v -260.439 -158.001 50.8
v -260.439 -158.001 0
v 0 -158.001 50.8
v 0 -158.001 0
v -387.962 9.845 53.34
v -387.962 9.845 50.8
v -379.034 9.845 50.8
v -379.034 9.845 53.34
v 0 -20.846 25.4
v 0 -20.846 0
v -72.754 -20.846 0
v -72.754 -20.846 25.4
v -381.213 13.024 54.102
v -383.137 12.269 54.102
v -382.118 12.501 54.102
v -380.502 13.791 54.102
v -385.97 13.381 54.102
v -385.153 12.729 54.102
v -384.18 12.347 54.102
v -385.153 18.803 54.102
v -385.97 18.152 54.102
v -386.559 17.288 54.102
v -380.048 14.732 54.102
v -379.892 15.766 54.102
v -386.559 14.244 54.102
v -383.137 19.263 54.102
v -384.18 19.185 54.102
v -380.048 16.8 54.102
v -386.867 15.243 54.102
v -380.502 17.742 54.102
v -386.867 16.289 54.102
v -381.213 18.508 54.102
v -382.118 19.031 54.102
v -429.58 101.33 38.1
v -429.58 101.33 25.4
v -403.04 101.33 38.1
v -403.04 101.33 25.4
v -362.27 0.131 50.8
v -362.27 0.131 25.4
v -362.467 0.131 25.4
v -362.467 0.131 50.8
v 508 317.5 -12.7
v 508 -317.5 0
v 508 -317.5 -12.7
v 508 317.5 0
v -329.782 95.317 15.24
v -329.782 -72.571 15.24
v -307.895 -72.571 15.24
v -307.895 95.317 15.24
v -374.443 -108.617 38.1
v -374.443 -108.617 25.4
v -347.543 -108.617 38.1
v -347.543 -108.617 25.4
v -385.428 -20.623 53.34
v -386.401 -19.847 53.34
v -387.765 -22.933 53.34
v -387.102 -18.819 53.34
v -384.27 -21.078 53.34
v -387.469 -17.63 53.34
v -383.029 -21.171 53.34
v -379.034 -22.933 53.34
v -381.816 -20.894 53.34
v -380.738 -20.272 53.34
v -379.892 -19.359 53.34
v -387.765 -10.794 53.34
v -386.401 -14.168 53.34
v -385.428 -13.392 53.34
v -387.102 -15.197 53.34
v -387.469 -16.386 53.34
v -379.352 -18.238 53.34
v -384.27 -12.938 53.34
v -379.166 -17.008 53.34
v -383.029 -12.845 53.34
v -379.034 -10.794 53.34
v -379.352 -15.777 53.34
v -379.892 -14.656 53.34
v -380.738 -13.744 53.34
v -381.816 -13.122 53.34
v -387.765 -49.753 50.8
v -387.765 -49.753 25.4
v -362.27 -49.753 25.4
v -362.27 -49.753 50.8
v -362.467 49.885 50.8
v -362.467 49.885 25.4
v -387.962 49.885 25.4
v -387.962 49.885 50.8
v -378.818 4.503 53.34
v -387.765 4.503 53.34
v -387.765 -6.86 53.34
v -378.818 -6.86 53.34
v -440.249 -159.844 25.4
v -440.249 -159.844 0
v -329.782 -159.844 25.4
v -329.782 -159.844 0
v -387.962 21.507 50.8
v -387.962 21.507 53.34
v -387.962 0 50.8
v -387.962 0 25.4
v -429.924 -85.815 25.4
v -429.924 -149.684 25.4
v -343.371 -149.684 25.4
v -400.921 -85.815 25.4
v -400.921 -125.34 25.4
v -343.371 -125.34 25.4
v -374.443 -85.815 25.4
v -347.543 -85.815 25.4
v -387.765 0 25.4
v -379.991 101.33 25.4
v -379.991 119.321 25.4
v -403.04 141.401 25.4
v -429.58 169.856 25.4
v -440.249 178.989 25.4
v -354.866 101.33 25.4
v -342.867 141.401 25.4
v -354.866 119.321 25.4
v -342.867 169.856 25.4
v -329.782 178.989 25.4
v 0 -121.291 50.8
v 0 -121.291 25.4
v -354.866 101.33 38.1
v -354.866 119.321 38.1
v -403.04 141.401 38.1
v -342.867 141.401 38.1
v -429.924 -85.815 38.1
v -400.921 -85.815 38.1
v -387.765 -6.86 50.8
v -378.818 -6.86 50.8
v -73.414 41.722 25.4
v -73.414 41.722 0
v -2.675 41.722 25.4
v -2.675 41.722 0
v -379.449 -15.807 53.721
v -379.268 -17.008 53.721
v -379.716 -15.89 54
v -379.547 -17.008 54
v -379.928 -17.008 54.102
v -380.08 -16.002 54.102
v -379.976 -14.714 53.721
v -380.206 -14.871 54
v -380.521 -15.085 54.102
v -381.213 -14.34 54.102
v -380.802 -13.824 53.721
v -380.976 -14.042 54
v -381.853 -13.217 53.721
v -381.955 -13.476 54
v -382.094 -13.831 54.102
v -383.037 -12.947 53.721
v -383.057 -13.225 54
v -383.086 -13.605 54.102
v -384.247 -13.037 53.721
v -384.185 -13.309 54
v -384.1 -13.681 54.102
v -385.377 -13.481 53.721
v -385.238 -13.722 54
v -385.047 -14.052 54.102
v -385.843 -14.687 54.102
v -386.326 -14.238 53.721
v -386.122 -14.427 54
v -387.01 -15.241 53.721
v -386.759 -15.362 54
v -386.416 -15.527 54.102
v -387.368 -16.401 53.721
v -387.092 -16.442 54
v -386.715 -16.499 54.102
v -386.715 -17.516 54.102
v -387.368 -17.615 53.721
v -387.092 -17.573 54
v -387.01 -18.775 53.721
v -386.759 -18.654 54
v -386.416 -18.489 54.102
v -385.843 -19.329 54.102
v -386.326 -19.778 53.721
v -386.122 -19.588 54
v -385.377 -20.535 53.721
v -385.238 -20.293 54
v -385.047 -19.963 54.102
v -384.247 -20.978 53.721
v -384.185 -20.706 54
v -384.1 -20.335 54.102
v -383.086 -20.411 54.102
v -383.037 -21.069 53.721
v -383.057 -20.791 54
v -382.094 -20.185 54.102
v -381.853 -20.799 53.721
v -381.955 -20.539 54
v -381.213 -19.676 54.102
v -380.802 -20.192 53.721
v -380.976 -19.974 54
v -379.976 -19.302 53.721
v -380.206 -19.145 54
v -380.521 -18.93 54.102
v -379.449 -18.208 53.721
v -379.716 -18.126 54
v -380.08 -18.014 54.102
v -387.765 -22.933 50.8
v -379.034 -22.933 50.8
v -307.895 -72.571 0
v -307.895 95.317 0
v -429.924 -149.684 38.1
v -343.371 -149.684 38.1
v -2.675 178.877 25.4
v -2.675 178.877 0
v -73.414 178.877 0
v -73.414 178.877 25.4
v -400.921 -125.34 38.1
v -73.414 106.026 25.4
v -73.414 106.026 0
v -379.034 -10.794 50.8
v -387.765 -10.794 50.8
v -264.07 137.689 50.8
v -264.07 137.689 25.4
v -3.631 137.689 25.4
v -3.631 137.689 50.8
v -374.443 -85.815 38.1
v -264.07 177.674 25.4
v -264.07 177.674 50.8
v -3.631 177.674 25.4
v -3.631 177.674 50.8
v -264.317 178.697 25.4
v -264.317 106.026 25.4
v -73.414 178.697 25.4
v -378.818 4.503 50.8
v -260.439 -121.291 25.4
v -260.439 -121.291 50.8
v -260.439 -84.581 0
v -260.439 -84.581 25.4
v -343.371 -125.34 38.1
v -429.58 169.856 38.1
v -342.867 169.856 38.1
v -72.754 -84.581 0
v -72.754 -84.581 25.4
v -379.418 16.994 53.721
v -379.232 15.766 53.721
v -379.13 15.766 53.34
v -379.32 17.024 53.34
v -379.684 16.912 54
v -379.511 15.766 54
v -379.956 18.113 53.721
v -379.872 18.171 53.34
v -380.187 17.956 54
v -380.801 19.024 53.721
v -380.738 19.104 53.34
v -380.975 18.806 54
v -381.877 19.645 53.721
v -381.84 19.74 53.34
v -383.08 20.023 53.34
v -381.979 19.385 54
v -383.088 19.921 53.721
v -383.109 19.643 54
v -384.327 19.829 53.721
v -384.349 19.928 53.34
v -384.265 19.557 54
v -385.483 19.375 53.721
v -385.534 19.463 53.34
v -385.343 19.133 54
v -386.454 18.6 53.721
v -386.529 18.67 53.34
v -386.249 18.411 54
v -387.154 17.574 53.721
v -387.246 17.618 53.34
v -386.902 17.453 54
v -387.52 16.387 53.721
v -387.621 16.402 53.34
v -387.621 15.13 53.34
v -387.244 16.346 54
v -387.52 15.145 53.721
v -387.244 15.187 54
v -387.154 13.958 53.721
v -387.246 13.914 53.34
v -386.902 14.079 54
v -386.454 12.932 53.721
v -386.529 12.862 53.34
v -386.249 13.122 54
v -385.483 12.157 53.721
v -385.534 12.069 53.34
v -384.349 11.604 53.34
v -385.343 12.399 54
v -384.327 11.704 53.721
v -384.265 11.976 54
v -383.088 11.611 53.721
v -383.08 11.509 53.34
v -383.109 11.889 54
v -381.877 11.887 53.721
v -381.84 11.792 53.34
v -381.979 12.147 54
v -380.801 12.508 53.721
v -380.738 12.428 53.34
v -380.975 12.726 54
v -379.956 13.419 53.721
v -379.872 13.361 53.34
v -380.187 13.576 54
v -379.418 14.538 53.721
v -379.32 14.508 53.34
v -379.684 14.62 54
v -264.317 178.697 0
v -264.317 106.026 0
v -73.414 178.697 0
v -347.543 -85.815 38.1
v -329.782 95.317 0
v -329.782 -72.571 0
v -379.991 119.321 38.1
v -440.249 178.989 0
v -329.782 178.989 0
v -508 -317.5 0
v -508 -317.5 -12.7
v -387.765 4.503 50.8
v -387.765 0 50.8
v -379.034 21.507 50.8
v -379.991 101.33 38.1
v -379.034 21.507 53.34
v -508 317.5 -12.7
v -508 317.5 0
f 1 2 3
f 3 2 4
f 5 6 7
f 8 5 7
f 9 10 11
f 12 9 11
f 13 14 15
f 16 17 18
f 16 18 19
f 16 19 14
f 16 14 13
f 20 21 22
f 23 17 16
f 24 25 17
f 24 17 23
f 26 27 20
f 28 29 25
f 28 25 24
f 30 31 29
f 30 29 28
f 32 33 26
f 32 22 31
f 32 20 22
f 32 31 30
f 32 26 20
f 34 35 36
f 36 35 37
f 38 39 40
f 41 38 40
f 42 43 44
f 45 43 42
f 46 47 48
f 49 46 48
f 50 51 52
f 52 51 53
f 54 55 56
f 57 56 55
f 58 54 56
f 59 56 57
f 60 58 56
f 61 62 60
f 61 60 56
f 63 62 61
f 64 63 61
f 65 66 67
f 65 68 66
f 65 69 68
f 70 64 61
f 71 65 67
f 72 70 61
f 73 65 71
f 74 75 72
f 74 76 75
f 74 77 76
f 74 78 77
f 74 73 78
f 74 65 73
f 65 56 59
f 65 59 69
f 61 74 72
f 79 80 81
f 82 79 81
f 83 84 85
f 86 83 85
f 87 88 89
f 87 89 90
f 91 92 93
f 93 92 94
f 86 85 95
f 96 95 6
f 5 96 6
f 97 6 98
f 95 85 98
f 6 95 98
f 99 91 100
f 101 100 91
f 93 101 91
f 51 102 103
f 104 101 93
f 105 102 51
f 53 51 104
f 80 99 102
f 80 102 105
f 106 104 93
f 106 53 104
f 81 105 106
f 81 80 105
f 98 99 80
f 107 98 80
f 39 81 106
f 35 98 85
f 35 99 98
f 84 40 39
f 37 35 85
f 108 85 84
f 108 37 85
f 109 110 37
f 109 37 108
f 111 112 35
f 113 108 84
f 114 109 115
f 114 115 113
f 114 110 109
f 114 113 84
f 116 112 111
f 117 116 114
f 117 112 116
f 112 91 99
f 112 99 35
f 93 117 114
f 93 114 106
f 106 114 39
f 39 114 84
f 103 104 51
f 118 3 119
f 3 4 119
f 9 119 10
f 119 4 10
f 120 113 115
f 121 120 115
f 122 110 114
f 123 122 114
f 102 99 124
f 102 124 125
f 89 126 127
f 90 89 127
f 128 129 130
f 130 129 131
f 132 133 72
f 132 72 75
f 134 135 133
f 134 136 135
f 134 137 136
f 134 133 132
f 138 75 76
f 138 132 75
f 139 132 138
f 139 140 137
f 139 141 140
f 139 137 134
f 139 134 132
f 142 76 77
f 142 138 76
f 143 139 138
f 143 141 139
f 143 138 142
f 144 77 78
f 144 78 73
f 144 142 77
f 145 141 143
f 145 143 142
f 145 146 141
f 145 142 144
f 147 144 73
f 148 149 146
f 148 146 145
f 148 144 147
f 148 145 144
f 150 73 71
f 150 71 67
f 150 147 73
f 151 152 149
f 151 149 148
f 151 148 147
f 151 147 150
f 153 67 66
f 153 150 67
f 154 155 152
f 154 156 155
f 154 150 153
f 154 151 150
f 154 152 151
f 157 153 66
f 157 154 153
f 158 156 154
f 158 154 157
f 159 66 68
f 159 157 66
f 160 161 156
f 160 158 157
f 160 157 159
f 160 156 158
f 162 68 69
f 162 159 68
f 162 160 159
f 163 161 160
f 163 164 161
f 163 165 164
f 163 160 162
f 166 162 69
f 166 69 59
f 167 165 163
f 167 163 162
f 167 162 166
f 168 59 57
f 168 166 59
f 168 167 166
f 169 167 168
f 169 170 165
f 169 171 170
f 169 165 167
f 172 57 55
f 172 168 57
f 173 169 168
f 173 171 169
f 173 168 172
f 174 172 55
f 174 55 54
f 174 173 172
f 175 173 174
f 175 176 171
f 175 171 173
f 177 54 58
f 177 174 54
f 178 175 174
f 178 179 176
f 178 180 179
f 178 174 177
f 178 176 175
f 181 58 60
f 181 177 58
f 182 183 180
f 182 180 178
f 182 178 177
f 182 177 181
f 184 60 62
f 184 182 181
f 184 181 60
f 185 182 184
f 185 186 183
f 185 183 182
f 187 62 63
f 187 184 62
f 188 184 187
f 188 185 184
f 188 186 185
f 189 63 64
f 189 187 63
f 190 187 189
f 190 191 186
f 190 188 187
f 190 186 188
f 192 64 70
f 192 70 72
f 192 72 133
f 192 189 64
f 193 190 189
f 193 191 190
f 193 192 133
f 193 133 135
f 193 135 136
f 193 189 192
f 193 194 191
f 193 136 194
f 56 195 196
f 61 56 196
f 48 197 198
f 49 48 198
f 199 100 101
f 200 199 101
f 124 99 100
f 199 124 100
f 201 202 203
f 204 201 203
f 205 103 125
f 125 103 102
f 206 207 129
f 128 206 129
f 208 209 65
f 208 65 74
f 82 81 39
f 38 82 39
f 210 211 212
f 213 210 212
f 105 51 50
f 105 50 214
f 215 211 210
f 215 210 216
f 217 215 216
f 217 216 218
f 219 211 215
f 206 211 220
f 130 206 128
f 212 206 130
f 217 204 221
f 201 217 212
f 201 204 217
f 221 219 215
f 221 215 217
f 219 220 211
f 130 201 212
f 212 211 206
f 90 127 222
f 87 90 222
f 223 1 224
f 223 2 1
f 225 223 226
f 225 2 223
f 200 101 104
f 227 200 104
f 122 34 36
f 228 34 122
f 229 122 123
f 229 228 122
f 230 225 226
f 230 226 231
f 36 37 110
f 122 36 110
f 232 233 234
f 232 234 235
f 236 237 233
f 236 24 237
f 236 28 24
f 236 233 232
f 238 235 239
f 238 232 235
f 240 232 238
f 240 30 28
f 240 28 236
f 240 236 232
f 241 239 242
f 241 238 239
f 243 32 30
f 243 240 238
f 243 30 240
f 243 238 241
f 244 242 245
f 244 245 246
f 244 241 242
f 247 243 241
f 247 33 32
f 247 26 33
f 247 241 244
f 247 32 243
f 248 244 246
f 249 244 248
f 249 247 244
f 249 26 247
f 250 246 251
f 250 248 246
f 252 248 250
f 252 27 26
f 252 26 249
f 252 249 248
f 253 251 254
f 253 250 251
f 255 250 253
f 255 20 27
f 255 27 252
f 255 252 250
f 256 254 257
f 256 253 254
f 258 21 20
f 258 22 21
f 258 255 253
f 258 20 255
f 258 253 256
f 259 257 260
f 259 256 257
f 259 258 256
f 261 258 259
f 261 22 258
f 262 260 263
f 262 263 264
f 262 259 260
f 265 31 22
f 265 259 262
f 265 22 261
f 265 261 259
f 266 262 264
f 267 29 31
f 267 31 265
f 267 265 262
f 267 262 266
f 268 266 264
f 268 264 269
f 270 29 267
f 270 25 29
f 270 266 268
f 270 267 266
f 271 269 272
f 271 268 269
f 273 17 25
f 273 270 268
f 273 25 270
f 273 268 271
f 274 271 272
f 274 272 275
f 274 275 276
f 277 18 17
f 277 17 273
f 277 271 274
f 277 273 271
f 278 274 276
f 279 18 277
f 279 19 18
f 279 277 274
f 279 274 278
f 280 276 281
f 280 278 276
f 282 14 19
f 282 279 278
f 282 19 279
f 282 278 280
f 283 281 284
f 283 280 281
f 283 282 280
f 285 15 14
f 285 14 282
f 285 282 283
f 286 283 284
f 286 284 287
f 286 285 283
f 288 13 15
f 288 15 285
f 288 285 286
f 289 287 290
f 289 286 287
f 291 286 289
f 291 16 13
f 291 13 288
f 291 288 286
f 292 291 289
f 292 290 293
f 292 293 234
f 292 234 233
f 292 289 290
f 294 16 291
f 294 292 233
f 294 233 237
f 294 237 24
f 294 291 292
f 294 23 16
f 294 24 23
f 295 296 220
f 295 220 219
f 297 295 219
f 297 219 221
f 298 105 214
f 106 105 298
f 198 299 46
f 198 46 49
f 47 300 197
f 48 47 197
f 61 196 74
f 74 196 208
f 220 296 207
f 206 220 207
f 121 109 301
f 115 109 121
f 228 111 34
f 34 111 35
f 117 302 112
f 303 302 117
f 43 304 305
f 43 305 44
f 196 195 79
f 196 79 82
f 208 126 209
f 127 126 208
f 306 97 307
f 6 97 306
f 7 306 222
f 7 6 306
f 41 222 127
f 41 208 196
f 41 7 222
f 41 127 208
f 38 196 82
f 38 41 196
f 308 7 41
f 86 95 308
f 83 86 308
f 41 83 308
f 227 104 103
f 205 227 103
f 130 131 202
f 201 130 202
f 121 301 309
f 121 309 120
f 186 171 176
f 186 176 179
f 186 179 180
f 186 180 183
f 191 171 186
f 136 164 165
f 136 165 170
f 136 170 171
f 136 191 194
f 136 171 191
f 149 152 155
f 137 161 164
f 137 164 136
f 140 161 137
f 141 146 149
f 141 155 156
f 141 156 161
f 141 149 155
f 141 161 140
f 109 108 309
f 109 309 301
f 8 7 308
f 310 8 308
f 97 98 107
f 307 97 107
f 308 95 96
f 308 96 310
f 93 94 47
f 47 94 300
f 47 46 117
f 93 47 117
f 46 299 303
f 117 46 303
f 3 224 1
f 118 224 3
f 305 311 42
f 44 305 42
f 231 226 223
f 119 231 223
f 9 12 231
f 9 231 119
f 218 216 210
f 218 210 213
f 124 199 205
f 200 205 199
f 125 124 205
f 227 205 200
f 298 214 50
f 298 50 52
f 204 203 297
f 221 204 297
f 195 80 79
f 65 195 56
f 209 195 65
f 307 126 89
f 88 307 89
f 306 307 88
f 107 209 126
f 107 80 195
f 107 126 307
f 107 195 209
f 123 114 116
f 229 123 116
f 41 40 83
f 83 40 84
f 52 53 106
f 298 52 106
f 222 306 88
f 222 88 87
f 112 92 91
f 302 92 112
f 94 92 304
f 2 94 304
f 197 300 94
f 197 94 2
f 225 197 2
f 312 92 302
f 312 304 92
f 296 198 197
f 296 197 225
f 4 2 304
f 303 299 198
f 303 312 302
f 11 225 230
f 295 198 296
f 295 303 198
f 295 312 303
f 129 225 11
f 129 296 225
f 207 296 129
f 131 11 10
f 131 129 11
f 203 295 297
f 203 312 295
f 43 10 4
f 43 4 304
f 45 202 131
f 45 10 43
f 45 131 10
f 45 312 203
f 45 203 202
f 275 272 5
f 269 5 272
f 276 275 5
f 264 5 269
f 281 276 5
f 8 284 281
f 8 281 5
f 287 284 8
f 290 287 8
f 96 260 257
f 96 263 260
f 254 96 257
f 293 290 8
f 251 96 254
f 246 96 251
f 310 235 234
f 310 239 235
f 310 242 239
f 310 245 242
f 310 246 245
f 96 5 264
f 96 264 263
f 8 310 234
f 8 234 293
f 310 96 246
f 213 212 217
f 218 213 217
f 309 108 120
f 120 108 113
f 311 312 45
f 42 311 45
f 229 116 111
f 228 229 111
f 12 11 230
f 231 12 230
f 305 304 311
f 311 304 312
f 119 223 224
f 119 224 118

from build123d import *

# Parameters (mm, degrees)
F0_W      = 1016
F0_H      = 635
F1_DEPTH  = 12.7
F2_W      = 190.9023970366
F2_H      = 72.670340538
F2_W_2    = 110.4675829411
F2_H_2    = 338.8325423002
F2_W_3    = 187.6850500703
F2_H_3    = 73.4205134213
F3_DEPTH  = 25.4
F4_W      = 260.4392468929
F4_H      = 36.7102567106
F4_H_2    = 39.9852208793
F4_W_2    = 25.2980589867
F4_H_3    = 0.1311842352
F5_DEPTH  = 25.4
F6_W      = 29.0026068687
F6_H      = 39.524897933
F6_W_2    = 26.9005596638
F6_H_2    = 22.802144289
F6_W_3    = 26.5395641327
F6_H_3    = 40.0708019733
F6_W_4    = 25.1247286797
F6_H_4    = 17.9900527
F7_DEPTH  = 12.7
F8_W      = 8.947044611
F8_H      = 11.3622983918
F8_W_2    = 8.928835392
F8_H_2    = 11.6621851921
F8_W_3    = 8.7315738201
F8_H_3    = 12.1389040723
F9_DEPTH  = 2.54
F10_R     = 4.1746501932
F10_R_2   = 4.2690475455
F11_DEPTH = 0.762
F12_R     = 0.76199
F13_W     = 21.8863785267
F13_H     = 167.8882390261
F14_DEPTH = 15.24


# Not quite as in the source:
# - a fillet or chamfer is up to 0.001 mm smaller than in the source, because OpenCascade refuses the exact size


with BuildPart() as f1:
    # F0 (on Top) → F1 (new body)
    with BuildSketch(Plane.XY):
        Rectangle(F0_W, F0_H)
    extrude(amount=-F1_DEPTH)

    # F2 (on face) → F3 (join)
    with BuildSketch(Plane.XY):
        Polygon((-73.4143704176, 178.6967664957), (-73.4143704176, 106.0264259577), (-73.4143704176, 41.7220070958), (-2.6750040706, 41.7220070958), (-2.6750040706, 178.8768768311), (-73.4143704176, 178.8768768311), align=None)
        with Locations((-168.8655689359, 142.3615962267)):
            Rectangle(F2_W, F2_H)
        with Locations((-385.0155323744, 9.5723941922)):
            Rectangle(F2_W_2, F2_H_2)
        with Locations((-166.5967218578, -121.2908085436)):
            Rectangle(F2_W_3, F2_H_3)
        Polygon((-72.7541968226, -84.5805518329), (-72.7541968226, -158.0010652542), (0, -158.0010652542), (0, -20.846195519), (-72.7541968226, -20.846195519), align=None)
    extrude(amount=F3_DEPTH)

    # F4 (on face) → F5 (join)
    with BuildSketch(Plane.XY.offset(25.4)):
        with Locations((-130.2196234465, -139.6459368989)):
            Rectangle(F4_W, F4_H)
        with Locations((-133.8504105806, 157.6813366264)):
            Rectangle(F4_W, F4_H_2)
        Polygon((-362.4670803547, 0.1311842352), (-362.4670803547, 0), (-387.7651393414, 0), (-387.7651393414, -49.7534926981), (-362.2698187828, -49.7534926981), (-362.2698187828, 0.1311842352), align=None)
        with Locations((-375.116109848, 0.0655921176)):
            Rectangle(F4_W_2, F4_H_3)
        Polygon((-387.9624009132, 0), (-387.7651393414, 0), (-387.7651393414, 0.1311842352), (-362.4670803547, 0.1311842352), (-362.4670803547, 49.8846769333), (-387.9624009132, 49.8846769333), align=None)
    extrude(amount=F5_DEPTH)

    # F6 (on face) → F7 (join)
    with BuildSketch(Plane.XY.offset(25.4)):
        Polygon((-343.3714807034, -149.6838778257), (-343.3714807034, -125.3397166729), (-400.9214937687, -125.3397166729), (-429.9241006374, -125.3397166729), (-429.9241006374, -149.6838778257), align=None)
        with Locations((-415.4227972031, -105.5772677064)):
            Rectangle(F6_W, F6_H)
        with Locations((-360.9930127859, -97.2158908844)):
            Rectangle(F6_W_2, F6_H_2)
        Polygon((-342.8669273853, 141.4012908936), (-342.8669273853, 169.8563098907), (-429.579526186, 169.8563098907), (-429.579526186, 141.4012908936), (-403.0399620533, 141.4012908936), align=None)
        with Locations((-416.3097441196, 121.3658899069)):
            Rectangle(F6_W_3, F6_H_3)
        with Locations((-367.4284219742, 110.3255152702)):
            Rectangle(F6_W_4, F6_H_4)
    extrude(amount=F7_DEPTH)

    # F8 (on face) → F9 (join)
    with BuildSketch(Plane.XY.offset(50.8)):
        with Locations((-383.2916170359, -1.178430859)):
            Rectangle(F8_W, F8_H)
        with Locations((-383.4979832172, 15.6762860715)):
            Rectangle(F8_W_2, F8_H_2)
        with Locations((-383.3993524313, -16.8637591414)):
            Rectangle(F8_W_3, F8_H_3)
    extrude(amount=F9_DEPTH)

    # F10 (on face) → F11 (join)
    with BuildSketch(Plane.XY.offset(53.34)):
        with Locations((-383.3409547806, -17.0078240335)):
            Circle(F10_R)
        with Locations((-383.3993524313, 15.7660990953)):
            Circle(F10_R_2)
    extrude(amount=F11_DEPTH)

    # F12 (radius 0.762 in the source; OpenCascade refuses exactly that, so slightly less here)
    f12_edges = [f1.edges().sort_by_distance(p)[0] for p in [
        (-387.515605, -17.007824, 54.102),
        (-387.6684, 15.766099, 54.102),
    ]]
    fillet(f12_edges, radius=F12_R)

    # F13 (on face) → F14 (join)
    with BuildSketch(Plane.XY):
        with Locations((-318.8385516405, 11.3731846213)):
            Rectangle(F13_W, F13_H)
    extrude(amount=F14_DEPTH)


solid = f1.part
